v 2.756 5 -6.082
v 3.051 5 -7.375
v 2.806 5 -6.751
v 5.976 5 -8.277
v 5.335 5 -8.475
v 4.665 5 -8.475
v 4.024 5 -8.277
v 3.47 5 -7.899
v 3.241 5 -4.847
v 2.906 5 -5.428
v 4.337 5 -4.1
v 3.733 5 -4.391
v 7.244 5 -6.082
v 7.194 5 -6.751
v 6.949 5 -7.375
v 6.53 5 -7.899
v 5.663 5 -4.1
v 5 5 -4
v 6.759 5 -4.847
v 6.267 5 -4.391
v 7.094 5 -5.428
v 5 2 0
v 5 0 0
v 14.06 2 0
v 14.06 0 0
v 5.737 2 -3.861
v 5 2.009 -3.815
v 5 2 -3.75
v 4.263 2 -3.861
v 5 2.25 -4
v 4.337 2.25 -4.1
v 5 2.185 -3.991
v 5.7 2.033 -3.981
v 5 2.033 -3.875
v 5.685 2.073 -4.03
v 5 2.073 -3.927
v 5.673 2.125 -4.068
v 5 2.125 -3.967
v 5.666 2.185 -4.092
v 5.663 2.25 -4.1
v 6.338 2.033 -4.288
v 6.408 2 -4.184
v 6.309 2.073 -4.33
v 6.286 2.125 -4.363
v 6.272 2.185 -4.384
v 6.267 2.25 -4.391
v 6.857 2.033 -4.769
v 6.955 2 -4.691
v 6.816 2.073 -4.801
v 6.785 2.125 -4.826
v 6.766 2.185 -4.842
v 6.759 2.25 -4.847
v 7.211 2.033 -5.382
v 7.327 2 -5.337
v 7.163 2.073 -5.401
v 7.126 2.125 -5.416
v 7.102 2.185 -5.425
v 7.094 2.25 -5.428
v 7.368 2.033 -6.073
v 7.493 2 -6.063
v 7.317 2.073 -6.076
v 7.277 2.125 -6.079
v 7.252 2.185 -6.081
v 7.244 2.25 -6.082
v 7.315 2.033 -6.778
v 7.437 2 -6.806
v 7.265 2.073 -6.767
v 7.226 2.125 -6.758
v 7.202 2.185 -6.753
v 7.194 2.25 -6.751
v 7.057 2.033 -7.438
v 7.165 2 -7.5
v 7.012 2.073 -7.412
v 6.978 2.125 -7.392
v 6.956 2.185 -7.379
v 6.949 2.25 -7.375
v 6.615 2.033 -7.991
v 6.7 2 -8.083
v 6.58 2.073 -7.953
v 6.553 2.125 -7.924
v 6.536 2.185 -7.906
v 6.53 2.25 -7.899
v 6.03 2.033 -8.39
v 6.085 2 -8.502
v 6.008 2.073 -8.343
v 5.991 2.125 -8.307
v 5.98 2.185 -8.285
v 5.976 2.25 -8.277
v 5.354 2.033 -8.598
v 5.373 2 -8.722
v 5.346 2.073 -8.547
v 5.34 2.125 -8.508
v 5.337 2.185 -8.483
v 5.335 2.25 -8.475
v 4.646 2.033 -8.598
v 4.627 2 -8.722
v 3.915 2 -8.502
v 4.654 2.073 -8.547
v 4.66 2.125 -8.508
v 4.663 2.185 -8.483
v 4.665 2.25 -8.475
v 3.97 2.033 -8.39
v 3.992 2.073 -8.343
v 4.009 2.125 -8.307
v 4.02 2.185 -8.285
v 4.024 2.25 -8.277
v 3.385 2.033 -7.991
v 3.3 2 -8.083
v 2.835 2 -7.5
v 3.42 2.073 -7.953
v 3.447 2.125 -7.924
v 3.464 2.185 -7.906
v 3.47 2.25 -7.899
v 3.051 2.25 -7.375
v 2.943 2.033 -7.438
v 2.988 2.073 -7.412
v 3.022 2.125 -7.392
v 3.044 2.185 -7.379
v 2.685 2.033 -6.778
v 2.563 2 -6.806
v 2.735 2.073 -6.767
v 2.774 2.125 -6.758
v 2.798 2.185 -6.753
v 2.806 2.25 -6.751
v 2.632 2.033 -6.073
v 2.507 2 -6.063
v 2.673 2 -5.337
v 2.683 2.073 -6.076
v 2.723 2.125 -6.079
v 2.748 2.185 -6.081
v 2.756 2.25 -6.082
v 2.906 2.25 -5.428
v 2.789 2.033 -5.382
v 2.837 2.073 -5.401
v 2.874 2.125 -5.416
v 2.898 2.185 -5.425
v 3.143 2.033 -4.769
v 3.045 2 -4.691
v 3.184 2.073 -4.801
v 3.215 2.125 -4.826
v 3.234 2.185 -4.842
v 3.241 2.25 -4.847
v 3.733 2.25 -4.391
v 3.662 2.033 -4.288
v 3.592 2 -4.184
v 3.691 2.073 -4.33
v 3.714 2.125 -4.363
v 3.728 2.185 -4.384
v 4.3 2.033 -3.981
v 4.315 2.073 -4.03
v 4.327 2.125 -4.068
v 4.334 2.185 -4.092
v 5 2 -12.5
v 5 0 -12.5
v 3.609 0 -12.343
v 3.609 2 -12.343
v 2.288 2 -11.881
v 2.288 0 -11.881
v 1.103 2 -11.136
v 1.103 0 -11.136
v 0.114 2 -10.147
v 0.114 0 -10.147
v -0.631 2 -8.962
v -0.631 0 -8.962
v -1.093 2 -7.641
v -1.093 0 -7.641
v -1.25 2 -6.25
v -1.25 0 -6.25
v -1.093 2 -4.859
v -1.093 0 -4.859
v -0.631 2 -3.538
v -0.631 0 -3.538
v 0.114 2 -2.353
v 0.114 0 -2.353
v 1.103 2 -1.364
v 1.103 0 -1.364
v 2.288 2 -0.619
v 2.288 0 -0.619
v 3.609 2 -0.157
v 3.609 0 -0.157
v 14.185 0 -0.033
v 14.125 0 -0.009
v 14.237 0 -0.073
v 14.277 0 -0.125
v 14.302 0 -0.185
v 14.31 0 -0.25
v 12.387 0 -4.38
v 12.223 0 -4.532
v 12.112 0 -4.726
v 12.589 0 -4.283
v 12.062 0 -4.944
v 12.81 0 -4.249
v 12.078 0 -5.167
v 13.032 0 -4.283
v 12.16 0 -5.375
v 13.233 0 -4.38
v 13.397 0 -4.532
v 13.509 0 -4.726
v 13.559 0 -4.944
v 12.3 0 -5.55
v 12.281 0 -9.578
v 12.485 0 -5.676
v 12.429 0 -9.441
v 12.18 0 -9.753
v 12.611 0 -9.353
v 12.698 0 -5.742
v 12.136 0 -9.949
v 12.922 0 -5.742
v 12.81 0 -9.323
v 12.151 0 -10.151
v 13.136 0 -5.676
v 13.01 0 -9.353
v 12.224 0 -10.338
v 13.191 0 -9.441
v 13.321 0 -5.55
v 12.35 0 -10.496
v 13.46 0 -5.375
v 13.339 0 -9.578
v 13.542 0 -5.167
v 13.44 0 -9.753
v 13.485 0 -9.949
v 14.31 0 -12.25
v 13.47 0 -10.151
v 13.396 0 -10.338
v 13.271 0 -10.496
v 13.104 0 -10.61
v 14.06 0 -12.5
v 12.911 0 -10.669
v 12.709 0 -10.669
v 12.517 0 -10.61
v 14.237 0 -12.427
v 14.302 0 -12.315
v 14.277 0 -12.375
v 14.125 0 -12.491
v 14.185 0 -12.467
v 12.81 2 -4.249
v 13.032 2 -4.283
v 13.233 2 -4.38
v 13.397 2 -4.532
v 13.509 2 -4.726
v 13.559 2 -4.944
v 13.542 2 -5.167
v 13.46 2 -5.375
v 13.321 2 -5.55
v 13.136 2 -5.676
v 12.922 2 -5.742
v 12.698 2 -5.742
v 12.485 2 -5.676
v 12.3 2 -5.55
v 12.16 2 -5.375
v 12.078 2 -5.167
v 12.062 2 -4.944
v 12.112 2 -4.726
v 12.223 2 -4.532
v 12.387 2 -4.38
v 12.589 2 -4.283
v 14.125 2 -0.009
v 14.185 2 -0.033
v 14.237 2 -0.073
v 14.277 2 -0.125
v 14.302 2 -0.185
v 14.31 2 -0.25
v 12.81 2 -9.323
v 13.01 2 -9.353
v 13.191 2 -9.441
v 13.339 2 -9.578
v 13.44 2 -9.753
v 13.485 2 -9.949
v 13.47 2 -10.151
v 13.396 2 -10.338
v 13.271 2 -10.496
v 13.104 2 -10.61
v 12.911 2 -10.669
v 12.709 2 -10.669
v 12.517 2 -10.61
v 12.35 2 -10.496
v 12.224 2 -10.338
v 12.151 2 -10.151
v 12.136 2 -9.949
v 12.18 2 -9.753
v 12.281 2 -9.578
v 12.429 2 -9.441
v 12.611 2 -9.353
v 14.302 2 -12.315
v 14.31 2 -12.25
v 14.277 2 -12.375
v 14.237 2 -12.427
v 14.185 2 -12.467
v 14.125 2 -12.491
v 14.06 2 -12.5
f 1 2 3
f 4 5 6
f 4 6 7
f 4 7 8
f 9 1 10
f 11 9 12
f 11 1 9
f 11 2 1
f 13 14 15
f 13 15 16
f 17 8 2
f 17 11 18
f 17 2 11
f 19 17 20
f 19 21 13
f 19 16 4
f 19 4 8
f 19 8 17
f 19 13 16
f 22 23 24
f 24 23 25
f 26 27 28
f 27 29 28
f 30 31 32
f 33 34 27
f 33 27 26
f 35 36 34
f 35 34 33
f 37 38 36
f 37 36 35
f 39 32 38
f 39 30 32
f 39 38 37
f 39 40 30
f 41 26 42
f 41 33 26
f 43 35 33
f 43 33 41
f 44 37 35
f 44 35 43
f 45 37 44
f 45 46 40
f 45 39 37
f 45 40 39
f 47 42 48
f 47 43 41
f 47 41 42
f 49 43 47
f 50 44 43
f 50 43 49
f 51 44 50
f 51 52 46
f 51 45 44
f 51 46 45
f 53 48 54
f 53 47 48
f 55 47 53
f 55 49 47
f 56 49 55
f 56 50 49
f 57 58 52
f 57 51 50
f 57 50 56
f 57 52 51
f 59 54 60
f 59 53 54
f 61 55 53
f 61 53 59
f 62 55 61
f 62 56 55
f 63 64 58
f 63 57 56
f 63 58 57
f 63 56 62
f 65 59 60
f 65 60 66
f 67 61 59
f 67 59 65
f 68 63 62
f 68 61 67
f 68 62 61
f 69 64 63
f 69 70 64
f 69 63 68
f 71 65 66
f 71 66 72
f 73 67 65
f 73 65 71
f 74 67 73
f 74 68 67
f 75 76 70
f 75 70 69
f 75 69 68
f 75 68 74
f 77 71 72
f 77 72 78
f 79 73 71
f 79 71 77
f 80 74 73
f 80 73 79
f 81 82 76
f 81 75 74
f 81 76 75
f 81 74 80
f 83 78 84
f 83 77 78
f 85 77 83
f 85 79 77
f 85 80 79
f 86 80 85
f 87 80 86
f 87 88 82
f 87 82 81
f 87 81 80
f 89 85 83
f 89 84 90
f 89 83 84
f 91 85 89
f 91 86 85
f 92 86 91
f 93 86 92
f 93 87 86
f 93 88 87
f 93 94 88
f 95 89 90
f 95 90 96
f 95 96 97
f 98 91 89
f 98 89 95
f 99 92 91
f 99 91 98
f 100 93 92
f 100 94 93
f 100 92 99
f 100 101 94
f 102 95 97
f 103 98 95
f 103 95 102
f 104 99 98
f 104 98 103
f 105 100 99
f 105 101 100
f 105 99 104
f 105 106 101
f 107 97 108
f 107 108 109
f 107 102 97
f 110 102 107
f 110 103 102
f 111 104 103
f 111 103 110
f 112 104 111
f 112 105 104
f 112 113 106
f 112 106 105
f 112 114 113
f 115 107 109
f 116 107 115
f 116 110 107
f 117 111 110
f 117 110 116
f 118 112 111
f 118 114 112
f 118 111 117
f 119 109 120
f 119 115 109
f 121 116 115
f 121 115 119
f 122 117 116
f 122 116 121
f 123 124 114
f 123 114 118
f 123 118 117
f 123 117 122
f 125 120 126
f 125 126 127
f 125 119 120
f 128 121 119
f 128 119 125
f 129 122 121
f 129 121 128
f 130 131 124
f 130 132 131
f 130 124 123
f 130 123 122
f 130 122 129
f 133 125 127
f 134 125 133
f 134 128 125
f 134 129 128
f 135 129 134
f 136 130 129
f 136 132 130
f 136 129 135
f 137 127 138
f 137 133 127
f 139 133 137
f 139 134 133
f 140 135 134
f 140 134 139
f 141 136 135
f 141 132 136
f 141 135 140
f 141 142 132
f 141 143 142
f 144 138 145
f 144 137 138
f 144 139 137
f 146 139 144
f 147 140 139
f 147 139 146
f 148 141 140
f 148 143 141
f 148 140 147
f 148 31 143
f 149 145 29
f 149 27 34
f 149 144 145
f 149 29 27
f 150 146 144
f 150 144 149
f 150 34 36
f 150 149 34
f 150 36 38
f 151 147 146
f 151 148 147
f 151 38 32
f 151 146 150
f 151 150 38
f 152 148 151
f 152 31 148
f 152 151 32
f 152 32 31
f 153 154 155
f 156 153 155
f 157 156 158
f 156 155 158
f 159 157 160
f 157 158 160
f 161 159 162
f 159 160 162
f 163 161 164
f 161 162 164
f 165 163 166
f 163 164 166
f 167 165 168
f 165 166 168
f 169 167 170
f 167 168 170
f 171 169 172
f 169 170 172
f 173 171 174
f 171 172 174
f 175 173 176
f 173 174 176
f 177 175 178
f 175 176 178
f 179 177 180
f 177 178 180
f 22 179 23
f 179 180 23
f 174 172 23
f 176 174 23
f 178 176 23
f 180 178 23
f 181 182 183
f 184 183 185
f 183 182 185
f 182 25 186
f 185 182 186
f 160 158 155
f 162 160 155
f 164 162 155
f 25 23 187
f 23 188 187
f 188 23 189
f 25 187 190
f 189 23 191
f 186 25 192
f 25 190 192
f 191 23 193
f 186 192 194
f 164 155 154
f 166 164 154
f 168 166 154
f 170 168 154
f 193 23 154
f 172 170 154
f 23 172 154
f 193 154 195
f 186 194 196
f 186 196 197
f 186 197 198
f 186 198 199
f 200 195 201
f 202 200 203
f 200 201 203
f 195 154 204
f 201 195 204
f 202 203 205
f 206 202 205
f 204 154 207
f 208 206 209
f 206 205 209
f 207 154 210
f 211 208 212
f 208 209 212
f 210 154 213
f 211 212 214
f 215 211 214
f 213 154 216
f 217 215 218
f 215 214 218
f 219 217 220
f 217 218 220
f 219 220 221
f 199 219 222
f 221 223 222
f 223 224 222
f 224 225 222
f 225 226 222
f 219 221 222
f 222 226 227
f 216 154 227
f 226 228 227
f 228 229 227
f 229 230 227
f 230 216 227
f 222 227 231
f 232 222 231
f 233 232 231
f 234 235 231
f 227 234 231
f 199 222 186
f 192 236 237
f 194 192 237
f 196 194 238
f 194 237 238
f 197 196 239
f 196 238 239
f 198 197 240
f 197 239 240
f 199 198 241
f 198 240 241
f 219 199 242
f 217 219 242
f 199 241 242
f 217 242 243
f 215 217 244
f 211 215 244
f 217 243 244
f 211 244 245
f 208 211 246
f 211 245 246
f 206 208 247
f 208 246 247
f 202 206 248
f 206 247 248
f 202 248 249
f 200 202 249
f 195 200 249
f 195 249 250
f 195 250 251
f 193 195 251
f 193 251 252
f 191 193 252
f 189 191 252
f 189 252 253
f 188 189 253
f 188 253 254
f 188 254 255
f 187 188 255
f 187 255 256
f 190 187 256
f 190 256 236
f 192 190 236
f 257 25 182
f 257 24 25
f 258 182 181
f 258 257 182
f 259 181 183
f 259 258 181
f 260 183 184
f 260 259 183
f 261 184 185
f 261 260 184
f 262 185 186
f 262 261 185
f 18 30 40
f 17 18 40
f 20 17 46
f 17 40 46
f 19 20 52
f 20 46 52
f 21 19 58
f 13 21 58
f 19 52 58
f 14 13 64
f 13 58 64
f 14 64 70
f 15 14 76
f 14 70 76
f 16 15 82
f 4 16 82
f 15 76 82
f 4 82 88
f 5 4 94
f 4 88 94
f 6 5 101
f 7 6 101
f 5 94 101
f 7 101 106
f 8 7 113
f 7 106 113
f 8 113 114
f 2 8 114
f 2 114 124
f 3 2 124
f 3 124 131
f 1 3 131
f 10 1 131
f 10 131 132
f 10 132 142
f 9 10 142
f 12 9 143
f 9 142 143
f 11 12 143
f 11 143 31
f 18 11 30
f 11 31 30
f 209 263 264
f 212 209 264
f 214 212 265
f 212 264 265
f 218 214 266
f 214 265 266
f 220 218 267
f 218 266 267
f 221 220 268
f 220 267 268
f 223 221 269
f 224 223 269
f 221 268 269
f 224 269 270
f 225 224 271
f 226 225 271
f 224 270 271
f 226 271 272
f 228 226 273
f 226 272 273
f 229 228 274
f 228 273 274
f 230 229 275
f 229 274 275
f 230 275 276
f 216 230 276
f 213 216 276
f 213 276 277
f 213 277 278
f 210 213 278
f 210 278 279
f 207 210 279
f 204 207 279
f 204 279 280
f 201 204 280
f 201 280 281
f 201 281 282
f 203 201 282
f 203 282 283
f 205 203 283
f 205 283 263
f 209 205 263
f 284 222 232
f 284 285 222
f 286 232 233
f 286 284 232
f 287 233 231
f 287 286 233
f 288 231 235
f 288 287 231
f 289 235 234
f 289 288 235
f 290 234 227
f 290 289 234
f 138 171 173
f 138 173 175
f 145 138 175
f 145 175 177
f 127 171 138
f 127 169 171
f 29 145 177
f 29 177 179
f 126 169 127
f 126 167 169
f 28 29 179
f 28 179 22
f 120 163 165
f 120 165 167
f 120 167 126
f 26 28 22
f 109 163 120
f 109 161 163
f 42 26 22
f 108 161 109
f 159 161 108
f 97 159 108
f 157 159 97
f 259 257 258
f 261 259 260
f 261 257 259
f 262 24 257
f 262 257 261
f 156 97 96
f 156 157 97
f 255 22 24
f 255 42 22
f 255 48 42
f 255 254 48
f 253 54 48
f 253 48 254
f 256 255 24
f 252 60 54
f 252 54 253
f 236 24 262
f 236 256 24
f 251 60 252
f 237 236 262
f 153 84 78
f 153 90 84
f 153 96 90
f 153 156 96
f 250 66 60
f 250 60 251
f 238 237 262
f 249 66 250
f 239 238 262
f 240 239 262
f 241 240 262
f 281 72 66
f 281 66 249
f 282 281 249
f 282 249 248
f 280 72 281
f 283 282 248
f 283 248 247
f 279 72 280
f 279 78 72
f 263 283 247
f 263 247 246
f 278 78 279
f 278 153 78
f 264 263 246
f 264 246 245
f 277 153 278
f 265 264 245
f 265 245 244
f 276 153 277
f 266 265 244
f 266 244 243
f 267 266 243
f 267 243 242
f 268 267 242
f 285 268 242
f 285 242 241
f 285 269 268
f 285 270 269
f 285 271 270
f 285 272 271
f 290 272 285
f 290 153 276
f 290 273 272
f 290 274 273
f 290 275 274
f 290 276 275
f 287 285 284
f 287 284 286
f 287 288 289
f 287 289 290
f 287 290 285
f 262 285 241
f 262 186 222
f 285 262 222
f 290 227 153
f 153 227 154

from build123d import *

# Parameters (mm, degrees)
EXTRUDE_1_DEPTH     = 2
SKETCH_2_R          = 2.25
EXTRUDE_2_DEPTH     = 3
SKETCH_3_R          = 0.676633681
SKETCH_3_R_2        = 0.750657672
CUT_EXTRUDE_1_DEPTH = 10
FILLET_1_R          = 0.25
FILLET_2_R          = 0.25


with BuildPart() as part:
    # 草图1 → 凸台-拉伸1 (new body)
    with BuildSketch(Plane(origin=(0, 0, 0), x_dir=(1, 0, 0), z_dir=(0, 1, 0))):
        with BuildLine():
            Line((5, 0), (14.310335592, 0))
            Line((14.310335592, 0), (14.310335592, 12.5))
            Line((14.310335592, 12.5), (5, 12.5))
            ThreePointArc((5, 12.5), (-1.25, 6.25), (5, 0))
        make_face()
    extrude(amount=EXTRUDE_1_DEPTH)

    # 草图2 → 凸台-拉伸2 (add)
    with BuildSketch(Plane(origin=(0, 2, 0), x_dir=(1, 0, 0), z_dir=(0, 1, 0))):
        with Locations(Location((5, 6.25, 0), (0, 0, 270))):
            Circle(SKETCH_2_R)
    extrude(amount=EXTRUDE_2_DEPTH)

    # 草图3 → 切除-拉伸1 (cut)
    with BuildSketch(Plane(origin=(0, 2, 0), x_dir=(1, 0, 0), z_dir=(0, 1, 0))):
        with Locations(Location((12.810335592, 10, 0), (0, 0, 270))):
            Circle(SKETCH_3_R)
        with Locations(Location((12.810335592, 5, 0), (0, 0, 270))):
            Circle(SKETCH_3_R_2)
    extrude(amount=-CUT_EXTRUDE_1_DEPTH, mode=Mode.SUBTRACT)

    # 圆角1
    fillet_1_edges = [part.edges().sort_by_distance(p)[0] for p in [
        (5, 2, -8.5),
    ]]
    fillet(fillet_1_edges, radius=FILLET_1_R)

    # 圆角2
    fillet_2_edges = [part.edges().sort_by_distance(p)[0] for p in [
        (14.310335592, 1, 0),
        (14.310335592, 1, -12.5),
    ]]
    fillet(fillet_2_edges, radius=FILLET_2_R)


solid = part.part
